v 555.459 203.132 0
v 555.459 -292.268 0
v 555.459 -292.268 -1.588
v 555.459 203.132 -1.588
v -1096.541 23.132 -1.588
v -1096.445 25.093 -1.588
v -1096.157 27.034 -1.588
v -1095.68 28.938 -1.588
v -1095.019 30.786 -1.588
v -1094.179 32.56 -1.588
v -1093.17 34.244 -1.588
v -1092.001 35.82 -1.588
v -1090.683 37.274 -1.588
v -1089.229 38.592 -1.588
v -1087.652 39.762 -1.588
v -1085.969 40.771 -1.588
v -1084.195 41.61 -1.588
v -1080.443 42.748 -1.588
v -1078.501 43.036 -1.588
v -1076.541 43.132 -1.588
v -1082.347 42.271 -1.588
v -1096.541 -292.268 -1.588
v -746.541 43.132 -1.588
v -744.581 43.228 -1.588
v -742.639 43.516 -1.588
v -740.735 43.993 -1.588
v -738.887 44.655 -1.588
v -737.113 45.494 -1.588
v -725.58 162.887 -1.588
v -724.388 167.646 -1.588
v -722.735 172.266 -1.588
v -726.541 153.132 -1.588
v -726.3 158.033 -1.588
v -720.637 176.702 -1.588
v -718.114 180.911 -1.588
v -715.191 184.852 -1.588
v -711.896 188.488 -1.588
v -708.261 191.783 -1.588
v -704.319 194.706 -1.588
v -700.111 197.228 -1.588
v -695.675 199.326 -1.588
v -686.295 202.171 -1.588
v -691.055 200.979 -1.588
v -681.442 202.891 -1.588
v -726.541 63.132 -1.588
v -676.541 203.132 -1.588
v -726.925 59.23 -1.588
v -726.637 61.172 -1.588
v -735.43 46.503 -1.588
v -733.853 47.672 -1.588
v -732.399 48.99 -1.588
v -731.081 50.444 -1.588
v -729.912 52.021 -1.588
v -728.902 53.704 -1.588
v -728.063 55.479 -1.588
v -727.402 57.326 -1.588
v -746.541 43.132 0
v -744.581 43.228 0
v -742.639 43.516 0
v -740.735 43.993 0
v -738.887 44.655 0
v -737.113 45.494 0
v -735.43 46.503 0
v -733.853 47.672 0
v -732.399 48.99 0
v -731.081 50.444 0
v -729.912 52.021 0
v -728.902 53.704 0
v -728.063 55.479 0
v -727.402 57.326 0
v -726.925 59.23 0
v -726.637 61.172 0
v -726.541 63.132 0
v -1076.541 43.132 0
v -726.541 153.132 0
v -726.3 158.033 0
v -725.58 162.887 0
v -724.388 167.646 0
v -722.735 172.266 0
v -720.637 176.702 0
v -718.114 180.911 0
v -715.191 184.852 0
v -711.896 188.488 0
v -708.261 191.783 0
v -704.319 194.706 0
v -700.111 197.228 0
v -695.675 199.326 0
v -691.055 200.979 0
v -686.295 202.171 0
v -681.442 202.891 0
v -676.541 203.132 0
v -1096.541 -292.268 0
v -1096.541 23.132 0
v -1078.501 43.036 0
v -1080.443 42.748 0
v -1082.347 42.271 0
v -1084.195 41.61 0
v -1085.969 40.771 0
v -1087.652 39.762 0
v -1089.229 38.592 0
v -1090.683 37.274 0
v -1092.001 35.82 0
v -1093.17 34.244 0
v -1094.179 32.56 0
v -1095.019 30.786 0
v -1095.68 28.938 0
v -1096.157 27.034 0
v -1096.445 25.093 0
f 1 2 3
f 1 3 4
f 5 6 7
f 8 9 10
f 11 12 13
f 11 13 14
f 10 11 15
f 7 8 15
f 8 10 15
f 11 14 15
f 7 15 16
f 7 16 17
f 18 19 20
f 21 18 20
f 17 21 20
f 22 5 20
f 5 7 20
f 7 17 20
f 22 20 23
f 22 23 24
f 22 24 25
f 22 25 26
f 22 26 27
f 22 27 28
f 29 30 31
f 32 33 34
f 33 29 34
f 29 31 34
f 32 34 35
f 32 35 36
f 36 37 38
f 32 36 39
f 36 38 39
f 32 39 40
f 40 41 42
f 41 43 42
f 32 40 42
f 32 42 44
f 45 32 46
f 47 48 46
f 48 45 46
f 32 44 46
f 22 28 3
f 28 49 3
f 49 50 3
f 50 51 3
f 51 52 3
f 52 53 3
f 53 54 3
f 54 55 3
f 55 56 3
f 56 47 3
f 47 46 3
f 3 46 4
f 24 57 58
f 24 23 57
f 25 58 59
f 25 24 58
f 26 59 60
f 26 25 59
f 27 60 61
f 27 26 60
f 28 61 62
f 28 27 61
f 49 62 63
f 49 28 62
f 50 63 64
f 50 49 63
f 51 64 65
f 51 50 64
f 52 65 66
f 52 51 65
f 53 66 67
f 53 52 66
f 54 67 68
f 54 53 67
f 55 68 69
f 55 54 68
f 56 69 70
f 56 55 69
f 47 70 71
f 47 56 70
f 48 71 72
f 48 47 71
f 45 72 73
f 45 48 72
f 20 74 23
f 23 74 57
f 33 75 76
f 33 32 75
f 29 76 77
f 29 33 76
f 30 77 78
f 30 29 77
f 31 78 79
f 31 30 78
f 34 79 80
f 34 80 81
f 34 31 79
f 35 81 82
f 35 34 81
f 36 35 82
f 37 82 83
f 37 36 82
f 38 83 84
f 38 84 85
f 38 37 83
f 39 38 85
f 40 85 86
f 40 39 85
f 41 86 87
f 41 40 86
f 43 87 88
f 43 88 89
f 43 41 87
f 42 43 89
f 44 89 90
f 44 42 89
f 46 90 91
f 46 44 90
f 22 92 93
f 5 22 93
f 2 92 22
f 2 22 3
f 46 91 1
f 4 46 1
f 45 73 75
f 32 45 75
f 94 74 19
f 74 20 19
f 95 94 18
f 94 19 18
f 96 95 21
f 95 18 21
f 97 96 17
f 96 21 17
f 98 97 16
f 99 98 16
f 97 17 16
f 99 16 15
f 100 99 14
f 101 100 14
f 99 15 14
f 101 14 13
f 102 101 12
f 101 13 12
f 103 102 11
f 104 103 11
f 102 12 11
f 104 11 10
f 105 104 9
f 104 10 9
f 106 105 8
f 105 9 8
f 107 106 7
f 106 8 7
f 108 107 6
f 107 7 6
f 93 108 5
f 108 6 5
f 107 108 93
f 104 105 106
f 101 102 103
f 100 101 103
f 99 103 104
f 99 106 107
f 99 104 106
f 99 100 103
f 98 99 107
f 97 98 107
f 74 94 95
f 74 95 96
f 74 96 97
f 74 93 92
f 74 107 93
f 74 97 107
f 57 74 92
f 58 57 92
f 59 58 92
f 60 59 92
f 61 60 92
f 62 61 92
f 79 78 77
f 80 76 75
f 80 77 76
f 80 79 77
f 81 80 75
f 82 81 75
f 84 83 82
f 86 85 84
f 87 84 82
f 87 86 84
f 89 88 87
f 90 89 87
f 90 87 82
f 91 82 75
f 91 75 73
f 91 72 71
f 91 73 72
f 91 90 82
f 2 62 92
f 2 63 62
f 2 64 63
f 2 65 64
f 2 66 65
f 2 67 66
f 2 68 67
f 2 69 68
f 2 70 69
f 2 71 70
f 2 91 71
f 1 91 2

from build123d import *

# Parameters (mm, degrees)
CROQUIS1_W            = 1652
CROQUIS1_H            = 495.4
BRIDA_BASE1_DEPTH     = 1.5875
CROQUIS21_W           = 370
CROQUIS21_H           = 160
CORTAR_EXTRUIR2_DEPTH = 10
REDONDEO4_R           = 20
REDONDEO5_R           = 50
REDONDEO6_R           = 20


# Sheet-metal steps are written as plain solids
with BuildPart() as part:
    # Croquis1 → Brida base1 (new body)
    with BuildSketch(Plane.XY):
        with Locations((-270.54091127, -44.567814371)):
            Rectangle(CROQUIS1_W, CROQUIS1_H)
    extrude(amount=-BRIDA_BASE1_DEPTH)

    # Croquis21 → Cortar-Extruir2 (cut)
    with BuildSketch(Plane.XY):
        with Locations((-911.54091127, 123.132185629)):
            Rectangle(CROQUIS21_W, CROQUIS21_H)
    extrude(amount=-CORTAR_EXTRUIR2_DEPTH, mode=Mode.SUBTRACT)

    # Redondeo4
    redondeo4_edges = [part.edges().sort_by_distance(p)[0] for p in [
        (-726.54091127, 43.132185629, -0.79375),
    ]]
    fillet(redondeo4_edges, radius=REDONDEO4_R)

    # Redondeo5
    redondeo5_edges = [part.edges().sort_by_distance(p)[0] for p in [
        (-726.54091127, 203.132185629, -0.79375),
    ]]
    fillet(redondeo5_edges, radius=REDONDEO5_R)

    # Redondeo6
    redondeo6_edges = [part.edges().sort_by_distance(p)[0] for p in [
        (-1096.54091127, 43.132185629, -0.79375),
    ]]
    fillet(redondeo6_edges, radius=REDONDEO6_R)


solid = part.part
